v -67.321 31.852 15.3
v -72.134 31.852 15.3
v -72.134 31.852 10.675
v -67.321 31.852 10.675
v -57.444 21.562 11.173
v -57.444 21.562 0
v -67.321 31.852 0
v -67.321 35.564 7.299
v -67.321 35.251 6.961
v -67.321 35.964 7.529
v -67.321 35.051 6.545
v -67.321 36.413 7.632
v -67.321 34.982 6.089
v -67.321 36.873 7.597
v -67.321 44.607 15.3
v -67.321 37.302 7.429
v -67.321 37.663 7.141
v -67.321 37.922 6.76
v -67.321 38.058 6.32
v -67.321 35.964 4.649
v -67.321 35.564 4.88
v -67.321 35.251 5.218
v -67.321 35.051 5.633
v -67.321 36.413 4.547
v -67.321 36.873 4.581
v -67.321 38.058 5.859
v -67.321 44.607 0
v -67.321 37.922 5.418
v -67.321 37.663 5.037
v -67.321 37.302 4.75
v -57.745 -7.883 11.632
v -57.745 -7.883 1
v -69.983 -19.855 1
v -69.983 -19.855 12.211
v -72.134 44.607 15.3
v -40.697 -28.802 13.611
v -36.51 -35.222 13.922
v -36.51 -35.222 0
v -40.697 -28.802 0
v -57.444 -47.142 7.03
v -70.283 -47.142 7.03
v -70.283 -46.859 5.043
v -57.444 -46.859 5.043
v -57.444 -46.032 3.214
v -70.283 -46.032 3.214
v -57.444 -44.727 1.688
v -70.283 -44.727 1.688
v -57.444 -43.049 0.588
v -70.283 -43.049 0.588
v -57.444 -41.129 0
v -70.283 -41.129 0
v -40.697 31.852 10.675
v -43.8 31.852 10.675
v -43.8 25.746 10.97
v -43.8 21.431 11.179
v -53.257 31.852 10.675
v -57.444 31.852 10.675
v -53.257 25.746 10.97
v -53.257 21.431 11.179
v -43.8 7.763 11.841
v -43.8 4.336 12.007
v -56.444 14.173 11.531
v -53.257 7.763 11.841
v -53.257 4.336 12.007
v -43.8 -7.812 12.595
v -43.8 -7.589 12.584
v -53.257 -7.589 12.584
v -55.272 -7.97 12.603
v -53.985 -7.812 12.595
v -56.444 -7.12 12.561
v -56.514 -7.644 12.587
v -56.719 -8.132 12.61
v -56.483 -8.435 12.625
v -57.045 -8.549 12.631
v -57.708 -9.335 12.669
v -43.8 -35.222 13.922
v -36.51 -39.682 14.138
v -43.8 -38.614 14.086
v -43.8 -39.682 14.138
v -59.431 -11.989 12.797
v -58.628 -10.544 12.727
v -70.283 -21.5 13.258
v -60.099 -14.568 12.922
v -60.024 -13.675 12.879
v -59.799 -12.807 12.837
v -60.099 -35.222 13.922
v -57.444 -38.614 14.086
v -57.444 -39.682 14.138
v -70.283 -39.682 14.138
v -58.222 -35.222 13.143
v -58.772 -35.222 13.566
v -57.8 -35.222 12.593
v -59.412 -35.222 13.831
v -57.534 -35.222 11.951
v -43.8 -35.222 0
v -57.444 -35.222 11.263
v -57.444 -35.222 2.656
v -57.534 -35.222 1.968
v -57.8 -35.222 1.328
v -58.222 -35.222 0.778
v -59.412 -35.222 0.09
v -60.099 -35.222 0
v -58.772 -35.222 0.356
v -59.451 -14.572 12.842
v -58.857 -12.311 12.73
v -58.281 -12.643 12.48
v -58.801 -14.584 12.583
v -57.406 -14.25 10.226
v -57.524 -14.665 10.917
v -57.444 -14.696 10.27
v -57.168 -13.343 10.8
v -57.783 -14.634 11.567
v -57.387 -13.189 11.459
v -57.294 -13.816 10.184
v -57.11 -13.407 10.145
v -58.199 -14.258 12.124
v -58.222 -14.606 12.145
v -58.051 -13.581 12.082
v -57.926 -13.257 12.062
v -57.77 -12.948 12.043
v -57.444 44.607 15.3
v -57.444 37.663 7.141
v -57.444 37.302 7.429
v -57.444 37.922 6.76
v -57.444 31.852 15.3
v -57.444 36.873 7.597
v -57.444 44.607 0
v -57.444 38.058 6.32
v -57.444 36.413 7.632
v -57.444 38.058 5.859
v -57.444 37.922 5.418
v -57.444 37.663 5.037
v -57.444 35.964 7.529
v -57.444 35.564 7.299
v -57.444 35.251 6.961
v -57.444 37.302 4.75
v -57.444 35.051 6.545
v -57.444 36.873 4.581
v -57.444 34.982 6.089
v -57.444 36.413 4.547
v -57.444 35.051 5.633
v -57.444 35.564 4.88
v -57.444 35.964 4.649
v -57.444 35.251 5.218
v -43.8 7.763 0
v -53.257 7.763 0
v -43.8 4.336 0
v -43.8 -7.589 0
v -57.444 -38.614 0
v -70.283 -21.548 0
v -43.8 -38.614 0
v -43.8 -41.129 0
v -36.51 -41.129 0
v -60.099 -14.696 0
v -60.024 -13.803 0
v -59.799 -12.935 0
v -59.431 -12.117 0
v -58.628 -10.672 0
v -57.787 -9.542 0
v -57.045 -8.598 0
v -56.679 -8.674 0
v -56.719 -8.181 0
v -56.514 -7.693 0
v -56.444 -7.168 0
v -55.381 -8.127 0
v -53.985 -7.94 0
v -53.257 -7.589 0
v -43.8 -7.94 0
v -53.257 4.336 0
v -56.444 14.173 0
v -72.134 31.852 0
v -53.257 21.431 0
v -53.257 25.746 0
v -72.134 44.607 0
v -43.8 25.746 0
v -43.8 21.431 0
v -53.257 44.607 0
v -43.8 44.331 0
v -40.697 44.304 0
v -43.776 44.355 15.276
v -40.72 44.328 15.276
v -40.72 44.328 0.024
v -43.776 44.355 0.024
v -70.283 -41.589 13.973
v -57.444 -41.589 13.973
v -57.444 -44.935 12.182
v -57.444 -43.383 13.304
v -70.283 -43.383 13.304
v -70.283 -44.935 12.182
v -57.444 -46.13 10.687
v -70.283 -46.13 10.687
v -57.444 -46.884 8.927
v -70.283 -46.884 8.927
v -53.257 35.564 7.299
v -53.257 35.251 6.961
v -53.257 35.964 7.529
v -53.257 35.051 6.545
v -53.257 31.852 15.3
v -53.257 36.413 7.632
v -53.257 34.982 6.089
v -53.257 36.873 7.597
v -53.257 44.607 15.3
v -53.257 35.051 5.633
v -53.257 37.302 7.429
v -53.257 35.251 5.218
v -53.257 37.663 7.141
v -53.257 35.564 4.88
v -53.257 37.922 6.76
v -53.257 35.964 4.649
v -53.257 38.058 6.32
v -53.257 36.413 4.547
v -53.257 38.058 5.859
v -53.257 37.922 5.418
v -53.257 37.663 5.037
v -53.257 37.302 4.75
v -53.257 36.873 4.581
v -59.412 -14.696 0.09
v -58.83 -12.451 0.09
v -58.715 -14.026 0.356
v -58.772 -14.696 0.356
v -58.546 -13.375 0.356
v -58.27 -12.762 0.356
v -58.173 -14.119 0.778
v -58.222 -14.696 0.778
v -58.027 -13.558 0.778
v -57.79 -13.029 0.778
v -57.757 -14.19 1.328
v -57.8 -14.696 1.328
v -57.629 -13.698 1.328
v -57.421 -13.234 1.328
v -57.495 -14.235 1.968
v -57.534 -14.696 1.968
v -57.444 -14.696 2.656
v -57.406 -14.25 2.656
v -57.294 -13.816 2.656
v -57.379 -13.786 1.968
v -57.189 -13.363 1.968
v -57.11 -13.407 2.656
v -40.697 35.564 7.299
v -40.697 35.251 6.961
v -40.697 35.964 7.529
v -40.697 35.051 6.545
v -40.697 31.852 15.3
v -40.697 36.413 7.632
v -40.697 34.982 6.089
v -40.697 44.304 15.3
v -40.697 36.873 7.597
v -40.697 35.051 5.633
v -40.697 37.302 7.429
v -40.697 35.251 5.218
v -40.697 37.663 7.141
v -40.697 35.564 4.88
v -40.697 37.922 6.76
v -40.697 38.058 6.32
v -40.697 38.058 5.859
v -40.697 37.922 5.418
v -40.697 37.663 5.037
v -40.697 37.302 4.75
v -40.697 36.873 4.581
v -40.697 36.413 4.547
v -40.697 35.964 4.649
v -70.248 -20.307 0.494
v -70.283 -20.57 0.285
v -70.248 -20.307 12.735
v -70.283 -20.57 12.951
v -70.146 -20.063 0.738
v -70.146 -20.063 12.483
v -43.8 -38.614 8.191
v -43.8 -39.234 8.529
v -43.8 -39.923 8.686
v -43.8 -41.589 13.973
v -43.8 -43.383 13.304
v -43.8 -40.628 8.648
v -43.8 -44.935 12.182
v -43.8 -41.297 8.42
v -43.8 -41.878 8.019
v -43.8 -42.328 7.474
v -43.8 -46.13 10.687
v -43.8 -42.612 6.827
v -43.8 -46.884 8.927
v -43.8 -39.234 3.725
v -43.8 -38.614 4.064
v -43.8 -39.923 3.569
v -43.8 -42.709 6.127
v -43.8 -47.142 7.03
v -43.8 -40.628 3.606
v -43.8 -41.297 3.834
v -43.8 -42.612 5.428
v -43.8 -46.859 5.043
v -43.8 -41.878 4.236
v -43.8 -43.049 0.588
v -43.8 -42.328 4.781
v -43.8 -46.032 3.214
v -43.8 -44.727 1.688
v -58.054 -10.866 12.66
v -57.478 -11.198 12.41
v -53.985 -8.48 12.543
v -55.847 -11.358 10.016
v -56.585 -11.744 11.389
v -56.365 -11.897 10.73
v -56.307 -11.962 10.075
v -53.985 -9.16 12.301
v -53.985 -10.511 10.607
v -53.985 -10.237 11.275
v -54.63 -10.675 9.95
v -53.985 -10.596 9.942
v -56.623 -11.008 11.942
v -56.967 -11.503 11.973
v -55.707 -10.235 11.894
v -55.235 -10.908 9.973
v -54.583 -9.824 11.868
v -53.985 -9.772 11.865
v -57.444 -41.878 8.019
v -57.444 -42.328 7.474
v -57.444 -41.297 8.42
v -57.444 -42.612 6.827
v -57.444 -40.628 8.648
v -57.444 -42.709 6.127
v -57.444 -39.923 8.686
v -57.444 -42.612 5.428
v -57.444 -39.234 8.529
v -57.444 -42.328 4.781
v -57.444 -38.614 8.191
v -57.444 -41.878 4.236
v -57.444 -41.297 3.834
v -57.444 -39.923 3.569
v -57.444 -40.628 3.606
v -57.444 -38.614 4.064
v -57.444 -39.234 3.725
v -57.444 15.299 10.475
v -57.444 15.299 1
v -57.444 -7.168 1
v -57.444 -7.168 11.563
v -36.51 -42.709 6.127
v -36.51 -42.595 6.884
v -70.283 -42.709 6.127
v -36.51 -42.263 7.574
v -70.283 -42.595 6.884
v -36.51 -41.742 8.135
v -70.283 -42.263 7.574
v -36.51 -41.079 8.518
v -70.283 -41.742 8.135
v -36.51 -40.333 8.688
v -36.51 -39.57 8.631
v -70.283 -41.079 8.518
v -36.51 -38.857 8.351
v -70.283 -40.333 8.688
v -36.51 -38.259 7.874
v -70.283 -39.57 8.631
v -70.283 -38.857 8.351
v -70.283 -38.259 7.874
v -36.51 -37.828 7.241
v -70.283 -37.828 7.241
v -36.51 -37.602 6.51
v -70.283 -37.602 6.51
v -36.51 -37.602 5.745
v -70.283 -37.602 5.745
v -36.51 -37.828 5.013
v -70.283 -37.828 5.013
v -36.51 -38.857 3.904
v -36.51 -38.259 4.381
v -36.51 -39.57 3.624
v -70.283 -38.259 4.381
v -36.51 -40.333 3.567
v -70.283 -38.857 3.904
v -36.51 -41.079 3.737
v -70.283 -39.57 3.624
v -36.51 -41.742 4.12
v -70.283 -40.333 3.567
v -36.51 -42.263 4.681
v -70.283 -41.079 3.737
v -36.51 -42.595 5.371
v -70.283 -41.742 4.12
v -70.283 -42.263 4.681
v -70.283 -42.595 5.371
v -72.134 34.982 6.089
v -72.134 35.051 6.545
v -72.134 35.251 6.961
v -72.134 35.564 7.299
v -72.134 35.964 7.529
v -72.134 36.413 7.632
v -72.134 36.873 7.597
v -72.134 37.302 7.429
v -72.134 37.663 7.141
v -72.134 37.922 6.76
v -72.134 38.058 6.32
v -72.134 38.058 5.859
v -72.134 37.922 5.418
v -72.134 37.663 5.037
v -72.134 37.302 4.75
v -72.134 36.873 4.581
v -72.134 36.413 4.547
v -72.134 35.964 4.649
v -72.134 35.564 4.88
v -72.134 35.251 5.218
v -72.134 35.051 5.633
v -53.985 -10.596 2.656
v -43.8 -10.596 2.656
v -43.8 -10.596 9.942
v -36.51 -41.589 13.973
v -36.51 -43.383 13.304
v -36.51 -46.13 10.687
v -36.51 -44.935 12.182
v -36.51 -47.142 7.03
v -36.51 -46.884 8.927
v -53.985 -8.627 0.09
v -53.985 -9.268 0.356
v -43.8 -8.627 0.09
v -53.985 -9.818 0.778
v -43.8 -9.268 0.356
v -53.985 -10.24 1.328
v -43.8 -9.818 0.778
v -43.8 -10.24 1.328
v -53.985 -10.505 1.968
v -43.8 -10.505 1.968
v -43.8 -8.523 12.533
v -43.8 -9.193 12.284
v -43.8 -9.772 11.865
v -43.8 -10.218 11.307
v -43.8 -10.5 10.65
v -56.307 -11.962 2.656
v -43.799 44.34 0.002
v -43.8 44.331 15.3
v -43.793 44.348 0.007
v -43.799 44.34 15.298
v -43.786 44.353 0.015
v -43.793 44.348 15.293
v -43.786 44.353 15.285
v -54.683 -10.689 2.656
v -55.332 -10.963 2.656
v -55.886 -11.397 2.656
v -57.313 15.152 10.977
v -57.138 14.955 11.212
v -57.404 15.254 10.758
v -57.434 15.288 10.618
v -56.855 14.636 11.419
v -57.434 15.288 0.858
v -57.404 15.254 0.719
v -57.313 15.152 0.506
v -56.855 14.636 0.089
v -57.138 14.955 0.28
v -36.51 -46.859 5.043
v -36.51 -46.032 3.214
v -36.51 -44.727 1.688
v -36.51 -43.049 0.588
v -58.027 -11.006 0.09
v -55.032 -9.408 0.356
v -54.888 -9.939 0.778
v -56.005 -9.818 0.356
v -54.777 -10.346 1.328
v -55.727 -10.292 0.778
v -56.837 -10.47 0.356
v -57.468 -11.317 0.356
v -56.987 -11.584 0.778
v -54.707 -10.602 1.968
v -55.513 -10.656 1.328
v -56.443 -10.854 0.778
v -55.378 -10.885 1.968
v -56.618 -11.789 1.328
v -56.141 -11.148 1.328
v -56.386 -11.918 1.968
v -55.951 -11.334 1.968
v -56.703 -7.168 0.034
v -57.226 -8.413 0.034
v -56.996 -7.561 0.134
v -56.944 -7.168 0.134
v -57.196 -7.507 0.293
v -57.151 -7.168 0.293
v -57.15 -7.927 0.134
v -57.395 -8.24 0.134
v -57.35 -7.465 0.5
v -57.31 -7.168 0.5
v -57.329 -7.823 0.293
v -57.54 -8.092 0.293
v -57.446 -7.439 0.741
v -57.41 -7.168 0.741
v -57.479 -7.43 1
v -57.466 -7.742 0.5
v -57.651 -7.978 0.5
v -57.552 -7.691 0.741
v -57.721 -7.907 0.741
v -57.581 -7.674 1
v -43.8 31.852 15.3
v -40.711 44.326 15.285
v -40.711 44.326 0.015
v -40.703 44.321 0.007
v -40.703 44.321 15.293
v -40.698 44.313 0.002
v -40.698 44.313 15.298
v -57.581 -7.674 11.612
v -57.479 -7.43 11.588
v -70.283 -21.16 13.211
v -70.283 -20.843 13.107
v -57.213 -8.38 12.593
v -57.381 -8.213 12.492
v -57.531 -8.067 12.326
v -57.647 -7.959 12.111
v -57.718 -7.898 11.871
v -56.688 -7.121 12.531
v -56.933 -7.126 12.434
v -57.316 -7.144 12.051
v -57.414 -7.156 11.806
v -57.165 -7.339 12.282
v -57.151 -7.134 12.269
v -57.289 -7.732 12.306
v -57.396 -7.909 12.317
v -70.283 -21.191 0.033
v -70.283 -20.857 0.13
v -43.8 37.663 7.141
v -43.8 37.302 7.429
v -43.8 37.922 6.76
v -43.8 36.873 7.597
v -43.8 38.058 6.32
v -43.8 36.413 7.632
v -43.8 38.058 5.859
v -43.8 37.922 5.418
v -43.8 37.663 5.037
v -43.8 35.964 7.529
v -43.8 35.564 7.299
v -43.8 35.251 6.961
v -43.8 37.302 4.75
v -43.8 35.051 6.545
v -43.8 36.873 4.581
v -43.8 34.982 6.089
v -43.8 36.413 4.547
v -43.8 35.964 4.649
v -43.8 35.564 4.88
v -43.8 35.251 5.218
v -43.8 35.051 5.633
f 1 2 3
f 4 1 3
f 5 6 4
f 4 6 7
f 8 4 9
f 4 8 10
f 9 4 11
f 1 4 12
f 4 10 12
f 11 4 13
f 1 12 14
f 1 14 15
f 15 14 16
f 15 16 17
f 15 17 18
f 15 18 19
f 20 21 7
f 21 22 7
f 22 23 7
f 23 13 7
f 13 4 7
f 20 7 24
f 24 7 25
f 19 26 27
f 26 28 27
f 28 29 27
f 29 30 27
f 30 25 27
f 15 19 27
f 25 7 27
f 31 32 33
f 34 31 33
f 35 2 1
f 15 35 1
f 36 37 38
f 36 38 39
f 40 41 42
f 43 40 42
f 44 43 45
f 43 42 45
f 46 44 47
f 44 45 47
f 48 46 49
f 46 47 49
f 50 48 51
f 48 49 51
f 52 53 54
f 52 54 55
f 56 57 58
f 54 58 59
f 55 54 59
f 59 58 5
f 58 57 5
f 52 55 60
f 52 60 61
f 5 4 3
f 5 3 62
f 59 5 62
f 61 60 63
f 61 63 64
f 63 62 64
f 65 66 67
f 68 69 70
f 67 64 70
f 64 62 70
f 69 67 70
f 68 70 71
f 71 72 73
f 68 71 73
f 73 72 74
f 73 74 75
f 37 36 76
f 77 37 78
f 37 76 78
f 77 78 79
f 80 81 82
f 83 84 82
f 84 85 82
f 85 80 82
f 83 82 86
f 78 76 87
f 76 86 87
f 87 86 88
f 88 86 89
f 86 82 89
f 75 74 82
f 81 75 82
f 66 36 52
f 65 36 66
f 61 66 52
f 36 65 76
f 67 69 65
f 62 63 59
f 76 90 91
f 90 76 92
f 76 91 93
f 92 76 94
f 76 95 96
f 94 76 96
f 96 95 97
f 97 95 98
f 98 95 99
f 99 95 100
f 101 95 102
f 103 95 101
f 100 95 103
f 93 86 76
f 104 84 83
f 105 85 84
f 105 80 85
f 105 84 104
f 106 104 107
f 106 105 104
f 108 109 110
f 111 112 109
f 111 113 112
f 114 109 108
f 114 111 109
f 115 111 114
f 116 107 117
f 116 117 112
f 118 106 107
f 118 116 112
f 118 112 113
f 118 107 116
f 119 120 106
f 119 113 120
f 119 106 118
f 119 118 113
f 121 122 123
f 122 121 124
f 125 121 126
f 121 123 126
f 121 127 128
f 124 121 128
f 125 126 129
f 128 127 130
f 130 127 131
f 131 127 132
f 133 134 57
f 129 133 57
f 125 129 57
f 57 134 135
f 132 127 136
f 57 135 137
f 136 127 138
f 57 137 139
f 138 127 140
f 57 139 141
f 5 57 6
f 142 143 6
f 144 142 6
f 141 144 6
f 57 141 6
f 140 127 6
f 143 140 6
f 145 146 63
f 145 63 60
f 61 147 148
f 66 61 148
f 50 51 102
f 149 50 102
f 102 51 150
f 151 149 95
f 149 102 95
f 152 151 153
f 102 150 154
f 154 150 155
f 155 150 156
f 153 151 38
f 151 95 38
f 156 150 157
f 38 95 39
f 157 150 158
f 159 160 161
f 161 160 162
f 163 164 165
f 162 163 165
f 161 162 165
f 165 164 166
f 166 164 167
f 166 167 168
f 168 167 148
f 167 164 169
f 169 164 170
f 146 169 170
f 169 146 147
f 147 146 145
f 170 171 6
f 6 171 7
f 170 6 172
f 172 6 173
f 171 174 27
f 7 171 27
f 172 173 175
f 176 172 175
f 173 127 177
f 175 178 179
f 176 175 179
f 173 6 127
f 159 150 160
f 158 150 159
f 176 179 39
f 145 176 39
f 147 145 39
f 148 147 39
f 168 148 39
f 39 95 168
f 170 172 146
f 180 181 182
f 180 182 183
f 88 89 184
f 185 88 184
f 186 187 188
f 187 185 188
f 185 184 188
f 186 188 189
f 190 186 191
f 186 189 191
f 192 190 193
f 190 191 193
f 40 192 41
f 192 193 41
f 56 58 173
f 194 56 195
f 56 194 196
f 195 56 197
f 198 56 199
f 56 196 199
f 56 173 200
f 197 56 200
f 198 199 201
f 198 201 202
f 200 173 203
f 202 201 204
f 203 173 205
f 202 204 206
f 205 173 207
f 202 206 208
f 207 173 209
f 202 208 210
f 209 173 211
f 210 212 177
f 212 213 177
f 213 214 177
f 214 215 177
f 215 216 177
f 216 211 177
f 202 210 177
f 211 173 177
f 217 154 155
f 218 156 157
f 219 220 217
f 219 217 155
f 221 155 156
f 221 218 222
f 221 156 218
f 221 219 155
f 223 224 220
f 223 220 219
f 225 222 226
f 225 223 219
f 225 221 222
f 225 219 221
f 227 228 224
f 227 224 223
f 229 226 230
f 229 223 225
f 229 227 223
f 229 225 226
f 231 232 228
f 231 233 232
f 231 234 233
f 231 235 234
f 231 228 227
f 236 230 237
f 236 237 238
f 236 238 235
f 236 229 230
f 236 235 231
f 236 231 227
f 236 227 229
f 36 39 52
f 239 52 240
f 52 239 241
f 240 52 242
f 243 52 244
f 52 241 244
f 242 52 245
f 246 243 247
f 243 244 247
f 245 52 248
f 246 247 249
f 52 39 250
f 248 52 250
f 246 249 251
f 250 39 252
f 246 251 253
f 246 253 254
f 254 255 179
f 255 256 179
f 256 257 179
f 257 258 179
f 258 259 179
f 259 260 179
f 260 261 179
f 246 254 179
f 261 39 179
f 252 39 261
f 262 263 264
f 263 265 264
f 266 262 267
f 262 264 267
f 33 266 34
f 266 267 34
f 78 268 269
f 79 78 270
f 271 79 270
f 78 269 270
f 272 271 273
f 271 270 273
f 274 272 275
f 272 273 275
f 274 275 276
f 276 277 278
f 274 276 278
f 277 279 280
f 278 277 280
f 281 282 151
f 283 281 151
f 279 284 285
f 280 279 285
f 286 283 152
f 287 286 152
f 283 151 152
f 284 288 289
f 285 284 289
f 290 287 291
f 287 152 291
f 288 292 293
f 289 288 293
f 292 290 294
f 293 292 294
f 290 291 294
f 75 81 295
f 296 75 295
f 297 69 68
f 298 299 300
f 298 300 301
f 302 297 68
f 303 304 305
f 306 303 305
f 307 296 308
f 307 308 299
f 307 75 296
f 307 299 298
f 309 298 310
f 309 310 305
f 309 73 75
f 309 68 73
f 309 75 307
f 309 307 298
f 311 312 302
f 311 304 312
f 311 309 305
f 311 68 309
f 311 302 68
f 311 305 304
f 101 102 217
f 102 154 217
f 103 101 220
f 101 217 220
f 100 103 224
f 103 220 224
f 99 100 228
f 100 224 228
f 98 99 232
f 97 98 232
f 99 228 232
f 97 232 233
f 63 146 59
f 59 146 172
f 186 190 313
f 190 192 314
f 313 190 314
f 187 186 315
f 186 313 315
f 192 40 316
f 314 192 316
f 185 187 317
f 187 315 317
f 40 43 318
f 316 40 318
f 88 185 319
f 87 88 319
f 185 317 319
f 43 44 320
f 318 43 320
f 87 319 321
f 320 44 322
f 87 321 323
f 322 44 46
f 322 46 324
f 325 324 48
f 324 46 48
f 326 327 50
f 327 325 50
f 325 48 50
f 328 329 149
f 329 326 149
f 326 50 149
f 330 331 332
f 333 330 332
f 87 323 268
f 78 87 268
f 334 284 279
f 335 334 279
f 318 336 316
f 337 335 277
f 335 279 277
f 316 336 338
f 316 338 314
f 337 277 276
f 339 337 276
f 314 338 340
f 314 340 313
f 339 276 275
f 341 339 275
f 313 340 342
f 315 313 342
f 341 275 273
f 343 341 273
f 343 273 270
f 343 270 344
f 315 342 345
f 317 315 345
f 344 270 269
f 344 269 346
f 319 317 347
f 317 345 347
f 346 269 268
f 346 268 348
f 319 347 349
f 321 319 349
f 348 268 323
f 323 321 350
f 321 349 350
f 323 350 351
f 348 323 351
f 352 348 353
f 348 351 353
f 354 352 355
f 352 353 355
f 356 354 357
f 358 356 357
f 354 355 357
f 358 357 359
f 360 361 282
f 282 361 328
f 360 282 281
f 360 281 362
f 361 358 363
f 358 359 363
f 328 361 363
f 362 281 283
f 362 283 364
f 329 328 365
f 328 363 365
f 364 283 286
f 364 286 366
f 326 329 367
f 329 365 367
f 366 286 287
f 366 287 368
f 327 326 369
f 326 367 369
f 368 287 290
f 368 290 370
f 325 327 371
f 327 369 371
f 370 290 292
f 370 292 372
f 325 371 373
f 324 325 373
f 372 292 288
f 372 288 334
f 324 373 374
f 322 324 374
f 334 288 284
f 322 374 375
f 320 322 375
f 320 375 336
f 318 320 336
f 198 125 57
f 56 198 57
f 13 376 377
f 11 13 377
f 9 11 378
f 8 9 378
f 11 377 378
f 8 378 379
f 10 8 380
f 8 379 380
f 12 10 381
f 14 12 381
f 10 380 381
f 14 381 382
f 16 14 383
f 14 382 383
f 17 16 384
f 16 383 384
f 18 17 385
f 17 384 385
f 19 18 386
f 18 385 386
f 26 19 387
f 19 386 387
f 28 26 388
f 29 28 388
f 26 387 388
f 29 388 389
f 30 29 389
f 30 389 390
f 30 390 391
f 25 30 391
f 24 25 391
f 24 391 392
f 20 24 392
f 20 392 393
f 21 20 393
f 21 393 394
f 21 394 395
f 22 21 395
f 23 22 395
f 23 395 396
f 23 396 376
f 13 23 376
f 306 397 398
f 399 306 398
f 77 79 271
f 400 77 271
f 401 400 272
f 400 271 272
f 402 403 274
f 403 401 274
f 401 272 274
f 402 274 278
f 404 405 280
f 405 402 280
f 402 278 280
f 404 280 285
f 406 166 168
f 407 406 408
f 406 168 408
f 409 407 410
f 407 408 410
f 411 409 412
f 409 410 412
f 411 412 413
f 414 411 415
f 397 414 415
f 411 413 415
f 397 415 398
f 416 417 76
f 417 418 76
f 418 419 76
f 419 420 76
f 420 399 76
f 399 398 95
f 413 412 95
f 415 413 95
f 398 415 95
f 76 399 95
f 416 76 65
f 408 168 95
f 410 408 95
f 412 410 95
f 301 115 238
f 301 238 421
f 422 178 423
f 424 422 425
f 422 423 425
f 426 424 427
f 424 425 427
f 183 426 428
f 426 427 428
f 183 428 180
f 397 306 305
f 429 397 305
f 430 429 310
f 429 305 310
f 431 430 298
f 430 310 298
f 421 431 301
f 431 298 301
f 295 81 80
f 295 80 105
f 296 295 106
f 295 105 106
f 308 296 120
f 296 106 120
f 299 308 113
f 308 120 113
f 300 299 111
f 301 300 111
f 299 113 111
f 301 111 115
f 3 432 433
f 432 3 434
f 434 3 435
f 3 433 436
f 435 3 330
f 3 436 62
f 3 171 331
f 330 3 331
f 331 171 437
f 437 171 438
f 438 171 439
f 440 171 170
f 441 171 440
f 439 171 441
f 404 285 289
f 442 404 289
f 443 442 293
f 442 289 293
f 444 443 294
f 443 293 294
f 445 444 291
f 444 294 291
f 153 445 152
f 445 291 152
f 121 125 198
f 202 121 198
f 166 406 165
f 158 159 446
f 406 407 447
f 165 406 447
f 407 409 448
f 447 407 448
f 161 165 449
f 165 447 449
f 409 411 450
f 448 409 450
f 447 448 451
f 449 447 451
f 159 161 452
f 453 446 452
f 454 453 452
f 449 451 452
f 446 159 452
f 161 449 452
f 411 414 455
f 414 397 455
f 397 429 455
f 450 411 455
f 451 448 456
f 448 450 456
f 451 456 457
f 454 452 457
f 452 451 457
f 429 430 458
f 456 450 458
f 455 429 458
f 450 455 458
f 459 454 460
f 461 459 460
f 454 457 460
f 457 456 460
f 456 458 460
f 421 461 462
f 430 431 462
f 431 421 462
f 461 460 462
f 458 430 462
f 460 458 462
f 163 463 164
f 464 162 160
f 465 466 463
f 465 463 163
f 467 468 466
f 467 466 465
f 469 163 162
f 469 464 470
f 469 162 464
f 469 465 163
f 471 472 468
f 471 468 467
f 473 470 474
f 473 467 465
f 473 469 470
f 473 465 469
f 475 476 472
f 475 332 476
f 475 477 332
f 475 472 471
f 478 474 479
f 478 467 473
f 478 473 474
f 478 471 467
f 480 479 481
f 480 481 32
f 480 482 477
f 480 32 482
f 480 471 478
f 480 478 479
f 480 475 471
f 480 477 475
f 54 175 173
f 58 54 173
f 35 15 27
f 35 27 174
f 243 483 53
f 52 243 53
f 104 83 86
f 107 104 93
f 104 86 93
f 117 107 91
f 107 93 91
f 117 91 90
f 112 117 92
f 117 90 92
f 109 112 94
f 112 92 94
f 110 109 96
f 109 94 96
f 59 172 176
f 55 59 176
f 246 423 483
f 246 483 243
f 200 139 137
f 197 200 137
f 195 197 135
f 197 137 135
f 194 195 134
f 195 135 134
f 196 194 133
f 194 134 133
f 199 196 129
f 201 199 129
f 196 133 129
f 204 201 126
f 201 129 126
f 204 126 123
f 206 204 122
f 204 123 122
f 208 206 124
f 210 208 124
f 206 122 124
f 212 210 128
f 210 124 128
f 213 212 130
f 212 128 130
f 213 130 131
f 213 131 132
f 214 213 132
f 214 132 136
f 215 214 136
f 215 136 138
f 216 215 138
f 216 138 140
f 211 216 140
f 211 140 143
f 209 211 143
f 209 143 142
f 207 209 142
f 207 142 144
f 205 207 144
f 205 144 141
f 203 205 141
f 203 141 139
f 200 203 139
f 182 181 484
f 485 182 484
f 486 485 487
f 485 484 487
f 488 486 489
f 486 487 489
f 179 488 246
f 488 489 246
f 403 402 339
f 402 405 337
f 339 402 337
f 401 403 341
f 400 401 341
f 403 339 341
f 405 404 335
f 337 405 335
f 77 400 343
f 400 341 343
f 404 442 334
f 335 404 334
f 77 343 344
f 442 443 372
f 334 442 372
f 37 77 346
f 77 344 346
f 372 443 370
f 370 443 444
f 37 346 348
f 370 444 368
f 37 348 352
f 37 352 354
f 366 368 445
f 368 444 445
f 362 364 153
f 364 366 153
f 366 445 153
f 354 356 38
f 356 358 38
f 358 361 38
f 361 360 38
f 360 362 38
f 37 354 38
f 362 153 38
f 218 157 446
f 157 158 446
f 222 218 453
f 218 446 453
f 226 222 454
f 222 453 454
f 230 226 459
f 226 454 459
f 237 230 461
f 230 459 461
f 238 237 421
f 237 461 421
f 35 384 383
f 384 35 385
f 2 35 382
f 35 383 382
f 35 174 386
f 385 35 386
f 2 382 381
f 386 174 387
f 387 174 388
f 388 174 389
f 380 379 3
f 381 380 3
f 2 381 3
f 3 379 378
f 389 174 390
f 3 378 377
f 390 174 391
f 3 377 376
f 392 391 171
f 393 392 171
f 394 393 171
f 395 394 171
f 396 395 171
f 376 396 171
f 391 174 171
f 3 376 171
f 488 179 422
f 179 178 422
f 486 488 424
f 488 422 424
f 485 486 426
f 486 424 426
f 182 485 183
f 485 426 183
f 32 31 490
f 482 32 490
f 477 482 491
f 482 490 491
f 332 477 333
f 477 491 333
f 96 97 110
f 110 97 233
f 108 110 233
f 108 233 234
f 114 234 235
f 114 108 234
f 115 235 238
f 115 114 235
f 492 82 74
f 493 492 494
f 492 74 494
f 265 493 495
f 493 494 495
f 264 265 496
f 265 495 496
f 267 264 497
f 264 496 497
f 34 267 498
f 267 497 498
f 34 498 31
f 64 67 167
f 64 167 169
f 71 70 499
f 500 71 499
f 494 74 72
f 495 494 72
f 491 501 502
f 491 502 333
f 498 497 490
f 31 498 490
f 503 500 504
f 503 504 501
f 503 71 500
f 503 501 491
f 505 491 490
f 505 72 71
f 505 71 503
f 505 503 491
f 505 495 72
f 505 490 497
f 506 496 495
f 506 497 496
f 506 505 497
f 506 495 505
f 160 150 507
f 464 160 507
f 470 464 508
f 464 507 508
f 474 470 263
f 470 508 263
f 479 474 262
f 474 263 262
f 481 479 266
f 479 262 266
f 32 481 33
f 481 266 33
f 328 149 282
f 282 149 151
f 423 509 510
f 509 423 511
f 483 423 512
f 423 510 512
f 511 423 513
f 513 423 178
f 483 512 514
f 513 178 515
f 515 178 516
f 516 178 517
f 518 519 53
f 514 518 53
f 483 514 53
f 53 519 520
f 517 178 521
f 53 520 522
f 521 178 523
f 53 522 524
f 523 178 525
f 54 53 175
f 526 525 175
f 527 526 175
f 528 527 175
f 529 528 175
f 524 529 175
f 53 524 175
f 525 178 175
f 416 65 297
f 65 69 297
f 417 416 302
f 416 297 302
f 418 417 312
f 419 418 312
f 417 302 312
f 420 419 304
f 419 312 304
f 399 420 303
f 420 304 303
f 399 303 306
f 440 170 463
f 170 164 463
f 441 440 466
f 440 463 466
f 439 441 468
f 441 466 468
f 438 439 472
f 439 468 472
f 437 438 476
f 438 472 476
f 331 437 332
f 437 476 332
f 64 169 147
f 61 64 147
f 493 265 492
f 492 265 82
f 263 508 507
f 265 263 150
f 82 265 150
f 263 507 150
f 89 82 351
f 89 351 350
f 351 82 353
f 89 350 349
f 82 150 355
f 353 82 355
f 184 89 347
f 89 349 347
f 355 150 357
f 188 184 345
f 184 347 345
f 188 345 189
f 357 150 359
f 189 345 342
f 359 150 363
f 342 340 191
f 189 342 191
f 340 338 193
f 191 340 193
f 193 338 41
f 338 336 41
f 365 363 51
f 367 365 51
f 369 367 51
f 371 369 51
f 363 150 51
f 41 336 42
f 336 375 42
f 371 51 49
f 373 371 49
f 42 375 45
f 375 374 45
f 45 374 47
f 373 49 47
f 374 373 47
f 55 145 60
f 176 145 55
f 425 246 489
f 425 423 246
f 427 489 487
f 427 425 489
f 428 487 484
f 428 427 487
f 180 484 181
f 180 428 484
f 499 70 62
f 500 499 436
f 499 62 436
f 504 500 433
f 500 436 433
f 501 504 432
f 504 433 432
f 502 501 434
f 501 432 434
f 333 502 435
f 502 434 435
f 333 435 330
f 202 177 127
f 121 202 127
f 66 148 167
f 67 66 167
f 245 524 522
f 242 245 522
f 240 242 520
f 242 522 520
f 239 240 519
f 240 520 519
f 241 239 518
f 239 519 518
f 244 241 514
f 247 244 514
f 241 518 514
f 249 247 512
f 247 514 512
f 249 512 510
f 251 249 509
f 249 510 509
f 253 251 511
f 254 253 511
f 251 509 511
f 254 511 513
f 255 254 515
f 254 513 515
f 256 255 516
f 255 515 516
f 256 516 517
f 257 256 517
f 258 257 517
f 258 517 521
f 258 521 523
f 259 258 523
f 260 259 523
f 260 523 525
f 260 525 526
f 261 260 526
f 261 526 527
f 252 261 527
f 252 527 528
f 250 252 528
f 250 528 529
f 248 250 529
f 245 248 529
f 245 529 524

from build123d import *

# Parameters (mm, degrees)
F0_W     = 9.4565711915
F0_H     = 13.6675285175
F1_DEPTH = 15.3
F2_W     = 109.1410517693
F2_H     = 22.5323475897
F3_DEPTH = 77
F4_R     = 2.5676865252
F5_DEPTH = 65.4
F6_R     = 1.5468397632
F7_DEPTH = 54.6
F8_R     = 2.6556349186
F9_R     = 1
F10_R    = 0.0237853743


with BuildPart() as f1:
    # F0 (on Top) → F1 (new body)
    with BuildSketch(Plane.XY):
        Polygon((-40.6965725124, 44.3279668689), (-43.8004508615, 44.3550609052), (-43.8004508615, 25.7457569242), (-53.257022053, 25.7457569242), (-53.257022053, 44.6070879698), (-57.4438385665, 44.6070879698), (-57.4438385665, 21.5618759394), (-67.321151495, 31.8517945707), (-67.321151495, 44.6070879698), (-72.1341744065, 44.6070879698), (-72.1341744065, 31.8517945707), (-57.4438385665, 15.2993714437), (-57.4438385665, -7.5885597616), (-70.2834129333, -20.1490093023), (-70.2834129333, -50.7155247033), (-57.4438385665, -50.7155247033), (-57.4438385665, -38.6135876179), (-43.8004508615, -38.6135876179), (-43.8004508615, -50.7155247033), (-36.5097559988, -50.7155247033), (-36.5097559988, -35.2215506136), (-40.6965725124, -28.8017634302), align=None)
        Polygon((-43.8004508615, -10.5956946412), (-43.8004508615, -35.2215506136), (-57.4438385665, -35.2215506136), (-57.4438385665, -14.0083450824), (-55.5479216548, -10.5956946412), align=None, mode=Mode.SUBTRACT)
        Polygon((-49.6741862581, -7.5885597616), (-53.257022053, -7.5885597616), (-53.257022053, 4.3360902928), (-49.6741862581, 4.3360902928), (-43.8004508615, 4.3360902928), (-43.8004508615, -7.5885597616), align=None, mode=Mode.SUBTRACT)
        with Locations((-48.5287364572, 14.5968659781)):
            Rectangle(F0_W, F0_H, mode=Mode.SUBTRACT)
    extrude(amount=F1_DEPTH)

    # F2 (on face) → F3 (cut)
    with BuildSketch(Plane(origin=(-72.1341744065, 0, 0), x_dir=(0, -1, 0), z_dir=(-1, 0, 0))):
        with Locations((3.7736594677, 6.6085606813)):
            Rectangle(F2_W, F2_H)
        with BuildLine():
            ThreePointArc((39.6816573, 14.1380049634), (44.9345471885, 12.1822751735), (47.1420204778, 7.0301112719))
            ThreePointArc((47.1420204778, 7.0301112719), (44.6510850499, 1.622031227), (38.9221144813, 0))
            Line((38.9221144813, 0), (-31.8517945707, 0))
            Line((-31.8517945707, 0), (-37.1405081916, 0))
            ThreePointArc((-37.1405081916, 0), (-38.2294412702, -0.1143932508), (-39.3183743488, 0))
            Line((-39.3183743488, 0), (-44.6070879698, 0))
            Line((-44.6070879698, 0), (-44.6070879698, 15.3))
            Line((-44.6070879698, 15.3), (-31.8517945707, 15.3))
            Line((-31.8517945707, 15.3), (-31.8517945707, 10.6745666141))
            Line((-31.8517945707, 10.6745666141), (39.6816573, 14.1380049634))
        make_face(mode=Mode.SUBTRACT)
    extrude(amount=-F3_DEPTH, mode=Mode.SUBTRACT)

    # F4 (on face) → F5 (cut)
    with BuildSketch(Plane(origin=(-72.1341744065, 0, 0), x_dir=(0, -1, 0), z_dir=(-1, 0, 0))):
        with Locations((40.1412695646, 6.1273775063)):
            Circle(F4_R)
    extrude(amount=-F5_DEPTH, mode=Mode.SUBTRACT)

    # F6 (on face) → F7 (cut)
    with BuildSketch(Plane(origin=(-72.1341744065, 0, 0), x_dir=(0, -1, 0), z_dir=(-1, 0, 0))):
        with Locations((-36.5287549794, 6.0891942121)):
            Circle(F6_R)
    extrude(amount=-F7_DEPTH, mode=Mode.SUBTRACT)

    # F8
    f8_edges = [f1.edges().sort_by_distance(p)[0] for p in [
        (-56.49588, -12.30202, 0),
        (-55.547922, -10.595695, 6.364874),
        (-56.49588, -12.30202, 12.812364),
        (-57.443839, -14.008345, 6.44749),
        (-49.674186, -10.595695, 0),
        (-57.443839, -24.614948, 0),
        (-49.674186, -10.595695, 12.729749),
        (-57.443839, -24.614948, 13.408519),
    ]]
    fillet(f8_edges, radius=F8_R)

    # F9
    f9_edges = [f1.edges().sort_by_distance(p)[0] for p in [
        (-63.863626, -13.868785, 0),
        (-70.283413, -20.149009, 6.596146),
        (-63.863626, -13.868785, 12.888222),
        (-57.443839, -7.58856, 6.292076),
        (-57.443839, 3.855406, 0),
        (-57.443839, 3.855406, 12.030069),
    ]]
    fillet(f9_edges, radius=F9_R)

    # F10
    f10_edges = [f1.edges().sort_by_distance(p)[0] for p in [
        (-40.696573, 44.327967, 7.65),
        (-43.800451, 44.355061, 7.65),
        (-42.248512, 44.341514, 0),
        (-42.248512, 44.341514, 15.3),
    ]]
    fillet(f10_edges, radius=F10_R)


solid = f1.part
